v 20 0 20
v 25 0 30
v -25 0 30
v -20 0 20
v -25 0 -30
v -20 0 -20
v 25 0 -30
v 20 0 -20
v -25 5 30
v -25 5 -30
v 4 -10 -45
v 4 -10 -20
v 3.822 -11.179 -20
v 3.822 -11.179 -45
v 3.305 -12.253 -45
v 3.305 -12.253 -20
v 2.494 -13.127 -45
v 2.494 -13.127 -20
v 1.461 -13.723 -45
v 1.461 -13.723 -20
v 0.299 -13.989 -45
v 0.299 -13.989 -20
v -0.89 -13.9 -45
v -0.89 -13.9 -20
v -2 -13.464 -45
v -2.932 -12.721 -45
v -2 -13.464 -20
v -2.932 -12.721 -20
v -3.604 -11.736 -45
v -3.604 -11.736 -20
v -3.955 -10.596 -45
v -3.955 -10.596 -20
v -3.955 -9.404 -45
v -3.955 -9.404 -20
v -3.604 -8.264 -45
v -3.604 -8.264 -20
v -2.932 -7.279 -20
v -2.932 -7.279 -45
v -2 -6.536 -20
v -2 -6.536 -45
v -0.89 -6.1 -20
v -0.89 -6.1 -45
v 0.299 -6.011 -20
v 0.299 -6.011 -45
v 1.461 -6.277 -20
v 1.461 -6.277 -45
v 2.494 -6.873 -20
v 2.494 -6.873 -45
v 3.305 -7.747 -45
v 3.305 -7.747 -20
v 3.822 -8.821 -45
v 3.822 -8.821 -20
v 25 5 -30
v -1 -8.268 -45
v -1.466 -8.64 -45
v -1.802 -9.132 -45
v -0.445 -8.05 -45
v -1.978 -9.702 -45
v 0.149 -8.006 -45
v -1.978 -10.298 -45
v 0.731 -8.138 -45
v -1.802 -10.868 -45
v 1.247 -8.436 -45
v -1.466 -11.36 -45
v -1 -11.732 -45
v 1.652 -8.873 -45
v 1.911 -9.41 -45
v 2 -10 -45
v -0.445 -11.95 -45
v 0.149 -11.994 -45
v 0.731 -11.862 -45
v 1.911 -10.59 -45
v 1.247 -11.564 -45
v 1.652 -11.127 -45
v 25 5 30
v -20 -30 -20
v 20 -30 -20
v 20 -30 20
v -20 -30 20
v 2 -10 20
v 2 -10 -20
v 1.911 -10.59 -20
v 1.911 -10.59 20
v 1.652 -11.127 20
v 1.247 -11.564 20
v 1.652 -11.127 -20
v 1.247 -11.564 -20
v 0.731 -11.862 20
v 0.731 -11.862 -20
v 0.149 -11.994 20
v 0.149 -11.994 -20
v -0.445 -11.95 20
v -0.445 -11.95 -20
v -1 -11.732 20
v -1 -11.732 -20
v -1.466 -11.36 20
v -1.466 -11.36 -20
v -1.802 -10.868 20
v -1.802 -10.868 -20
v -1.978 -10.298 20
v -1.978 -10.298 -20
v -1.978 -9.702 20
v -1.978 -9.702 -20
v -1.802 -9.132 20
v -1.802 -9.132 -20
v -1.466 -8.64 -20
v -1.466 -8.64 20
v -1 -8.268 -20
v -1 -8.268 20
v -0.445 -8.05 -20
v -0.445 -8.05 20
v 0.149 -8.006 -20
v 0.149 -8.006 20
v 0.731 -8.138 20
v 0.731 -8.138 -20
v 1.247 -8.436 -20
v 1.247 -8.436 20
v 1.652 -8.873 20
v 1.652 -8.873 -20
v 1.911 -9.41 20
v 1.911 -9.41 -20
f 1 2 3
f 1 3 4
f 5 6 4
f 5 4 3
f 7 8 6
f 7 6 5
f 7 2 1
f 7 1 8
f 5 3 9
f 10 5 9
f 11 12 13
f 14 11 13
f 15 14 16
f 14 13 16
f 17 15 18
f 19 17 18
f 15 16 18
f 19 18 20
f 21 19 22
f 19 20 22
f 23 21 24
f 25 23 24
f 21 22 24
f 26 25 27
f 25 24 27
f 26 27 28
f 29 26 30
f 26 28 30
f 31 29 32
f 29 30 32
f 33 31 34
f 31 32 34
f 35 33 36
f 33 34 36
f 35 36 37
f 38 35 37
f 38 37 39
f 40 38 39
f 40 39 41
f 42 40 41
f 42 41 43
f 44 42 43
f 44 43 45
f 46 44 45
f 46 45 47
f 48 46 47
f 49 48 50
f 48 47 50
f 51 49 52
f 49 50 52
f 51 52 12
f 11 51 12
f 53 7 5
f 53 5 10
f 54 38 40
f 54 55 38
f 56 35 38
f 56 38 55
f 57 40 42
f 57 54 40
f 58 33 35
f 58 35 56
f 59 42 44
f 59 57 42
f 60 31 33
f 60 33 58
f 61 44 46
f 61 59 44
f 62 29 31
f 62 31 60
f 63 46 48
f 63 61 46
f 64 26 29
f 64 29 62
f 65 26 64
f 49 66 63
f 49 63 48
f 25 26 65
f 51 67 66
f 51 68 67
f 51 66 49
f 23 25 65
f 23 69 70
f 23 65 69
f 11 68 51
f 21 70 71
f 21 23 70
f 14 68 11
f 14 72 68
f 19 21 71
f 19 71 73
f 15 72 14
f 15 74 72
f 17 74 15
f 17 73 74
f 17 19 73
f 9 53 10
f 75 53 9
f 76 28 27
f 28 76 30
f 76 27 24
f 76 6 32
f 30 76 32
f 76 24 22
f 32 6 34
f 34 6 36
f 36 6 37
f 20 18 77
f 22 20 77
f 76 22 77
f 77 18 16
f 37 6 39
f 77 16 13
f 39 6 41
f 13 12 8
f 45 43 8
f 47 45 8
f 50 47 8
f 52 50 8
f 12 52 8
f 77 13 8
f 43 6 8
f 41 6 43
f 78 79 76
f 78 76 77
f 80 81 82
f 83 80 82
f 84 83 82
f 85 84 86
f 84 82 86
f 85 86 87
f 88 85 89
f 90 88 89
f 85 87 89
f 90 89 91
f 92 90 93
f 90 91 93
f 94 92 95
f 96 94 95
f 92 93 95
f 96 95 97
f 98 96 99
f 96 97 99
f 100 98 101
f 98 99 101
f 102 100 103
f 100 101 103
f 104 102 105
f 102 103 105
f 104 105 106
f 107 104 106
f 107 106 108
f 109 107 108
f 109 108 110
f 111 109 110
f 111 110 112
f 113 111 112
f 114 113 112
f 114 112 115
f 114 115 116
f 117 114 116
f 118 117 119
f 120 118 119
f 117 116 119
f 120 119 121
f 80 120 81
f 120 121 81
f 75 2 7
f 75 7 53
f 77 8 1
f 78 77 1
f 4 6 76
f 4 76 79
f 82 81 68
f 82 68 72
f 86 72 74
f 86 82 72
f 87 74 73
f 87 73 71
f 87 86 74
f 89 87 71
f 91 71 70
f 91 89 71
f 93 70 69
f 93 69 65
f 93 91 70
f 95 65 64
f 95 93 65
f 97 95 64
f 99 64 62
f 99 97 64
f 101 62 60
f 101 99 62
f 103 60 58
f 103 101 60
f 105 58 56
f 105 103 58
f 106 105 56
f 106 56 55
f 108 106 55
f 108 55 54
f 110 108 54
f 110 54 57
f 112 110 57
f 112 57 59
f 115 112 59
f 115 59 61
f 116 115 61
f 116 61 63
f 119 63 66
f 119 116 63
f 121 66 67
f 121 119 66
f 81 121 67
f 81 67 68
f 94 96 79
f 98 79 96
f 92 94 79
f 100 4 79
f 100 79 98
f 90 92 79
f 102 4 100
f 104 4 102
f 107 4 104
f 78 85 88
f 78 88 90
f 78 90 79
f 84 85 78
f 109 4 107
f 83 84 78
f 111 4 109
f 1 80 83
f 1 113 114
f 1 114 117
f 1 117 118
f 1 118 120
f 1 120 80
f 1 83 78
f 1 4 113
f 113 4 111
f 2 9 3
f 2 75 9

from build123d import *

# Parameters (mm, degrees)
F0_W     = 40
F0_H     = 40
F1_DEPTH = 30
F2_R     = 4
F2_R_2   = 2
F3_DEPTH = 25
F4_DEPTH = 40
F6_DEPTH = 25


with BuildPart() as f1:
    # F0 (on Front) → F1 (new body)
    with BuildSketch(Plane.XZ):
        Rectangle(F0_W, F0_H)
    extrude(amount=F1_DEPTH)

    # F2 (on face) → F3 (join)
    with BuildSketch(Plane(origin=(0, 0, -20), x_dir=(1, 0, 0), z_dir=(0, 0, -1))):
        with Locations((0, 10)):
            Circle(F2_R)
        with Locations((0, 10)):
            Circle(F2_R_2, mode=Mode.SUBTRACT)
    extrude(amount=F3_DEPTH)

    # F4 (cut): a face of the model
    f4_faces = [f1.faces().sort_by_distance(p)[0] for p in [
        (0, -10, -20),
    ]]
    extrude(f4_faces, amount=-F4_DEPTH, mode=Mode.SUBTRACT)

    # F5 (on Right) → F6 (join, symmetric)
    with BuildSketch(Plane.YZ):
        Polygon((0, 30), (0, 0), (0, -30), (5, -30), (5, 30), align=None)
    extrude(amount=F6_DEPTH, both=True)


solid = f1.part
